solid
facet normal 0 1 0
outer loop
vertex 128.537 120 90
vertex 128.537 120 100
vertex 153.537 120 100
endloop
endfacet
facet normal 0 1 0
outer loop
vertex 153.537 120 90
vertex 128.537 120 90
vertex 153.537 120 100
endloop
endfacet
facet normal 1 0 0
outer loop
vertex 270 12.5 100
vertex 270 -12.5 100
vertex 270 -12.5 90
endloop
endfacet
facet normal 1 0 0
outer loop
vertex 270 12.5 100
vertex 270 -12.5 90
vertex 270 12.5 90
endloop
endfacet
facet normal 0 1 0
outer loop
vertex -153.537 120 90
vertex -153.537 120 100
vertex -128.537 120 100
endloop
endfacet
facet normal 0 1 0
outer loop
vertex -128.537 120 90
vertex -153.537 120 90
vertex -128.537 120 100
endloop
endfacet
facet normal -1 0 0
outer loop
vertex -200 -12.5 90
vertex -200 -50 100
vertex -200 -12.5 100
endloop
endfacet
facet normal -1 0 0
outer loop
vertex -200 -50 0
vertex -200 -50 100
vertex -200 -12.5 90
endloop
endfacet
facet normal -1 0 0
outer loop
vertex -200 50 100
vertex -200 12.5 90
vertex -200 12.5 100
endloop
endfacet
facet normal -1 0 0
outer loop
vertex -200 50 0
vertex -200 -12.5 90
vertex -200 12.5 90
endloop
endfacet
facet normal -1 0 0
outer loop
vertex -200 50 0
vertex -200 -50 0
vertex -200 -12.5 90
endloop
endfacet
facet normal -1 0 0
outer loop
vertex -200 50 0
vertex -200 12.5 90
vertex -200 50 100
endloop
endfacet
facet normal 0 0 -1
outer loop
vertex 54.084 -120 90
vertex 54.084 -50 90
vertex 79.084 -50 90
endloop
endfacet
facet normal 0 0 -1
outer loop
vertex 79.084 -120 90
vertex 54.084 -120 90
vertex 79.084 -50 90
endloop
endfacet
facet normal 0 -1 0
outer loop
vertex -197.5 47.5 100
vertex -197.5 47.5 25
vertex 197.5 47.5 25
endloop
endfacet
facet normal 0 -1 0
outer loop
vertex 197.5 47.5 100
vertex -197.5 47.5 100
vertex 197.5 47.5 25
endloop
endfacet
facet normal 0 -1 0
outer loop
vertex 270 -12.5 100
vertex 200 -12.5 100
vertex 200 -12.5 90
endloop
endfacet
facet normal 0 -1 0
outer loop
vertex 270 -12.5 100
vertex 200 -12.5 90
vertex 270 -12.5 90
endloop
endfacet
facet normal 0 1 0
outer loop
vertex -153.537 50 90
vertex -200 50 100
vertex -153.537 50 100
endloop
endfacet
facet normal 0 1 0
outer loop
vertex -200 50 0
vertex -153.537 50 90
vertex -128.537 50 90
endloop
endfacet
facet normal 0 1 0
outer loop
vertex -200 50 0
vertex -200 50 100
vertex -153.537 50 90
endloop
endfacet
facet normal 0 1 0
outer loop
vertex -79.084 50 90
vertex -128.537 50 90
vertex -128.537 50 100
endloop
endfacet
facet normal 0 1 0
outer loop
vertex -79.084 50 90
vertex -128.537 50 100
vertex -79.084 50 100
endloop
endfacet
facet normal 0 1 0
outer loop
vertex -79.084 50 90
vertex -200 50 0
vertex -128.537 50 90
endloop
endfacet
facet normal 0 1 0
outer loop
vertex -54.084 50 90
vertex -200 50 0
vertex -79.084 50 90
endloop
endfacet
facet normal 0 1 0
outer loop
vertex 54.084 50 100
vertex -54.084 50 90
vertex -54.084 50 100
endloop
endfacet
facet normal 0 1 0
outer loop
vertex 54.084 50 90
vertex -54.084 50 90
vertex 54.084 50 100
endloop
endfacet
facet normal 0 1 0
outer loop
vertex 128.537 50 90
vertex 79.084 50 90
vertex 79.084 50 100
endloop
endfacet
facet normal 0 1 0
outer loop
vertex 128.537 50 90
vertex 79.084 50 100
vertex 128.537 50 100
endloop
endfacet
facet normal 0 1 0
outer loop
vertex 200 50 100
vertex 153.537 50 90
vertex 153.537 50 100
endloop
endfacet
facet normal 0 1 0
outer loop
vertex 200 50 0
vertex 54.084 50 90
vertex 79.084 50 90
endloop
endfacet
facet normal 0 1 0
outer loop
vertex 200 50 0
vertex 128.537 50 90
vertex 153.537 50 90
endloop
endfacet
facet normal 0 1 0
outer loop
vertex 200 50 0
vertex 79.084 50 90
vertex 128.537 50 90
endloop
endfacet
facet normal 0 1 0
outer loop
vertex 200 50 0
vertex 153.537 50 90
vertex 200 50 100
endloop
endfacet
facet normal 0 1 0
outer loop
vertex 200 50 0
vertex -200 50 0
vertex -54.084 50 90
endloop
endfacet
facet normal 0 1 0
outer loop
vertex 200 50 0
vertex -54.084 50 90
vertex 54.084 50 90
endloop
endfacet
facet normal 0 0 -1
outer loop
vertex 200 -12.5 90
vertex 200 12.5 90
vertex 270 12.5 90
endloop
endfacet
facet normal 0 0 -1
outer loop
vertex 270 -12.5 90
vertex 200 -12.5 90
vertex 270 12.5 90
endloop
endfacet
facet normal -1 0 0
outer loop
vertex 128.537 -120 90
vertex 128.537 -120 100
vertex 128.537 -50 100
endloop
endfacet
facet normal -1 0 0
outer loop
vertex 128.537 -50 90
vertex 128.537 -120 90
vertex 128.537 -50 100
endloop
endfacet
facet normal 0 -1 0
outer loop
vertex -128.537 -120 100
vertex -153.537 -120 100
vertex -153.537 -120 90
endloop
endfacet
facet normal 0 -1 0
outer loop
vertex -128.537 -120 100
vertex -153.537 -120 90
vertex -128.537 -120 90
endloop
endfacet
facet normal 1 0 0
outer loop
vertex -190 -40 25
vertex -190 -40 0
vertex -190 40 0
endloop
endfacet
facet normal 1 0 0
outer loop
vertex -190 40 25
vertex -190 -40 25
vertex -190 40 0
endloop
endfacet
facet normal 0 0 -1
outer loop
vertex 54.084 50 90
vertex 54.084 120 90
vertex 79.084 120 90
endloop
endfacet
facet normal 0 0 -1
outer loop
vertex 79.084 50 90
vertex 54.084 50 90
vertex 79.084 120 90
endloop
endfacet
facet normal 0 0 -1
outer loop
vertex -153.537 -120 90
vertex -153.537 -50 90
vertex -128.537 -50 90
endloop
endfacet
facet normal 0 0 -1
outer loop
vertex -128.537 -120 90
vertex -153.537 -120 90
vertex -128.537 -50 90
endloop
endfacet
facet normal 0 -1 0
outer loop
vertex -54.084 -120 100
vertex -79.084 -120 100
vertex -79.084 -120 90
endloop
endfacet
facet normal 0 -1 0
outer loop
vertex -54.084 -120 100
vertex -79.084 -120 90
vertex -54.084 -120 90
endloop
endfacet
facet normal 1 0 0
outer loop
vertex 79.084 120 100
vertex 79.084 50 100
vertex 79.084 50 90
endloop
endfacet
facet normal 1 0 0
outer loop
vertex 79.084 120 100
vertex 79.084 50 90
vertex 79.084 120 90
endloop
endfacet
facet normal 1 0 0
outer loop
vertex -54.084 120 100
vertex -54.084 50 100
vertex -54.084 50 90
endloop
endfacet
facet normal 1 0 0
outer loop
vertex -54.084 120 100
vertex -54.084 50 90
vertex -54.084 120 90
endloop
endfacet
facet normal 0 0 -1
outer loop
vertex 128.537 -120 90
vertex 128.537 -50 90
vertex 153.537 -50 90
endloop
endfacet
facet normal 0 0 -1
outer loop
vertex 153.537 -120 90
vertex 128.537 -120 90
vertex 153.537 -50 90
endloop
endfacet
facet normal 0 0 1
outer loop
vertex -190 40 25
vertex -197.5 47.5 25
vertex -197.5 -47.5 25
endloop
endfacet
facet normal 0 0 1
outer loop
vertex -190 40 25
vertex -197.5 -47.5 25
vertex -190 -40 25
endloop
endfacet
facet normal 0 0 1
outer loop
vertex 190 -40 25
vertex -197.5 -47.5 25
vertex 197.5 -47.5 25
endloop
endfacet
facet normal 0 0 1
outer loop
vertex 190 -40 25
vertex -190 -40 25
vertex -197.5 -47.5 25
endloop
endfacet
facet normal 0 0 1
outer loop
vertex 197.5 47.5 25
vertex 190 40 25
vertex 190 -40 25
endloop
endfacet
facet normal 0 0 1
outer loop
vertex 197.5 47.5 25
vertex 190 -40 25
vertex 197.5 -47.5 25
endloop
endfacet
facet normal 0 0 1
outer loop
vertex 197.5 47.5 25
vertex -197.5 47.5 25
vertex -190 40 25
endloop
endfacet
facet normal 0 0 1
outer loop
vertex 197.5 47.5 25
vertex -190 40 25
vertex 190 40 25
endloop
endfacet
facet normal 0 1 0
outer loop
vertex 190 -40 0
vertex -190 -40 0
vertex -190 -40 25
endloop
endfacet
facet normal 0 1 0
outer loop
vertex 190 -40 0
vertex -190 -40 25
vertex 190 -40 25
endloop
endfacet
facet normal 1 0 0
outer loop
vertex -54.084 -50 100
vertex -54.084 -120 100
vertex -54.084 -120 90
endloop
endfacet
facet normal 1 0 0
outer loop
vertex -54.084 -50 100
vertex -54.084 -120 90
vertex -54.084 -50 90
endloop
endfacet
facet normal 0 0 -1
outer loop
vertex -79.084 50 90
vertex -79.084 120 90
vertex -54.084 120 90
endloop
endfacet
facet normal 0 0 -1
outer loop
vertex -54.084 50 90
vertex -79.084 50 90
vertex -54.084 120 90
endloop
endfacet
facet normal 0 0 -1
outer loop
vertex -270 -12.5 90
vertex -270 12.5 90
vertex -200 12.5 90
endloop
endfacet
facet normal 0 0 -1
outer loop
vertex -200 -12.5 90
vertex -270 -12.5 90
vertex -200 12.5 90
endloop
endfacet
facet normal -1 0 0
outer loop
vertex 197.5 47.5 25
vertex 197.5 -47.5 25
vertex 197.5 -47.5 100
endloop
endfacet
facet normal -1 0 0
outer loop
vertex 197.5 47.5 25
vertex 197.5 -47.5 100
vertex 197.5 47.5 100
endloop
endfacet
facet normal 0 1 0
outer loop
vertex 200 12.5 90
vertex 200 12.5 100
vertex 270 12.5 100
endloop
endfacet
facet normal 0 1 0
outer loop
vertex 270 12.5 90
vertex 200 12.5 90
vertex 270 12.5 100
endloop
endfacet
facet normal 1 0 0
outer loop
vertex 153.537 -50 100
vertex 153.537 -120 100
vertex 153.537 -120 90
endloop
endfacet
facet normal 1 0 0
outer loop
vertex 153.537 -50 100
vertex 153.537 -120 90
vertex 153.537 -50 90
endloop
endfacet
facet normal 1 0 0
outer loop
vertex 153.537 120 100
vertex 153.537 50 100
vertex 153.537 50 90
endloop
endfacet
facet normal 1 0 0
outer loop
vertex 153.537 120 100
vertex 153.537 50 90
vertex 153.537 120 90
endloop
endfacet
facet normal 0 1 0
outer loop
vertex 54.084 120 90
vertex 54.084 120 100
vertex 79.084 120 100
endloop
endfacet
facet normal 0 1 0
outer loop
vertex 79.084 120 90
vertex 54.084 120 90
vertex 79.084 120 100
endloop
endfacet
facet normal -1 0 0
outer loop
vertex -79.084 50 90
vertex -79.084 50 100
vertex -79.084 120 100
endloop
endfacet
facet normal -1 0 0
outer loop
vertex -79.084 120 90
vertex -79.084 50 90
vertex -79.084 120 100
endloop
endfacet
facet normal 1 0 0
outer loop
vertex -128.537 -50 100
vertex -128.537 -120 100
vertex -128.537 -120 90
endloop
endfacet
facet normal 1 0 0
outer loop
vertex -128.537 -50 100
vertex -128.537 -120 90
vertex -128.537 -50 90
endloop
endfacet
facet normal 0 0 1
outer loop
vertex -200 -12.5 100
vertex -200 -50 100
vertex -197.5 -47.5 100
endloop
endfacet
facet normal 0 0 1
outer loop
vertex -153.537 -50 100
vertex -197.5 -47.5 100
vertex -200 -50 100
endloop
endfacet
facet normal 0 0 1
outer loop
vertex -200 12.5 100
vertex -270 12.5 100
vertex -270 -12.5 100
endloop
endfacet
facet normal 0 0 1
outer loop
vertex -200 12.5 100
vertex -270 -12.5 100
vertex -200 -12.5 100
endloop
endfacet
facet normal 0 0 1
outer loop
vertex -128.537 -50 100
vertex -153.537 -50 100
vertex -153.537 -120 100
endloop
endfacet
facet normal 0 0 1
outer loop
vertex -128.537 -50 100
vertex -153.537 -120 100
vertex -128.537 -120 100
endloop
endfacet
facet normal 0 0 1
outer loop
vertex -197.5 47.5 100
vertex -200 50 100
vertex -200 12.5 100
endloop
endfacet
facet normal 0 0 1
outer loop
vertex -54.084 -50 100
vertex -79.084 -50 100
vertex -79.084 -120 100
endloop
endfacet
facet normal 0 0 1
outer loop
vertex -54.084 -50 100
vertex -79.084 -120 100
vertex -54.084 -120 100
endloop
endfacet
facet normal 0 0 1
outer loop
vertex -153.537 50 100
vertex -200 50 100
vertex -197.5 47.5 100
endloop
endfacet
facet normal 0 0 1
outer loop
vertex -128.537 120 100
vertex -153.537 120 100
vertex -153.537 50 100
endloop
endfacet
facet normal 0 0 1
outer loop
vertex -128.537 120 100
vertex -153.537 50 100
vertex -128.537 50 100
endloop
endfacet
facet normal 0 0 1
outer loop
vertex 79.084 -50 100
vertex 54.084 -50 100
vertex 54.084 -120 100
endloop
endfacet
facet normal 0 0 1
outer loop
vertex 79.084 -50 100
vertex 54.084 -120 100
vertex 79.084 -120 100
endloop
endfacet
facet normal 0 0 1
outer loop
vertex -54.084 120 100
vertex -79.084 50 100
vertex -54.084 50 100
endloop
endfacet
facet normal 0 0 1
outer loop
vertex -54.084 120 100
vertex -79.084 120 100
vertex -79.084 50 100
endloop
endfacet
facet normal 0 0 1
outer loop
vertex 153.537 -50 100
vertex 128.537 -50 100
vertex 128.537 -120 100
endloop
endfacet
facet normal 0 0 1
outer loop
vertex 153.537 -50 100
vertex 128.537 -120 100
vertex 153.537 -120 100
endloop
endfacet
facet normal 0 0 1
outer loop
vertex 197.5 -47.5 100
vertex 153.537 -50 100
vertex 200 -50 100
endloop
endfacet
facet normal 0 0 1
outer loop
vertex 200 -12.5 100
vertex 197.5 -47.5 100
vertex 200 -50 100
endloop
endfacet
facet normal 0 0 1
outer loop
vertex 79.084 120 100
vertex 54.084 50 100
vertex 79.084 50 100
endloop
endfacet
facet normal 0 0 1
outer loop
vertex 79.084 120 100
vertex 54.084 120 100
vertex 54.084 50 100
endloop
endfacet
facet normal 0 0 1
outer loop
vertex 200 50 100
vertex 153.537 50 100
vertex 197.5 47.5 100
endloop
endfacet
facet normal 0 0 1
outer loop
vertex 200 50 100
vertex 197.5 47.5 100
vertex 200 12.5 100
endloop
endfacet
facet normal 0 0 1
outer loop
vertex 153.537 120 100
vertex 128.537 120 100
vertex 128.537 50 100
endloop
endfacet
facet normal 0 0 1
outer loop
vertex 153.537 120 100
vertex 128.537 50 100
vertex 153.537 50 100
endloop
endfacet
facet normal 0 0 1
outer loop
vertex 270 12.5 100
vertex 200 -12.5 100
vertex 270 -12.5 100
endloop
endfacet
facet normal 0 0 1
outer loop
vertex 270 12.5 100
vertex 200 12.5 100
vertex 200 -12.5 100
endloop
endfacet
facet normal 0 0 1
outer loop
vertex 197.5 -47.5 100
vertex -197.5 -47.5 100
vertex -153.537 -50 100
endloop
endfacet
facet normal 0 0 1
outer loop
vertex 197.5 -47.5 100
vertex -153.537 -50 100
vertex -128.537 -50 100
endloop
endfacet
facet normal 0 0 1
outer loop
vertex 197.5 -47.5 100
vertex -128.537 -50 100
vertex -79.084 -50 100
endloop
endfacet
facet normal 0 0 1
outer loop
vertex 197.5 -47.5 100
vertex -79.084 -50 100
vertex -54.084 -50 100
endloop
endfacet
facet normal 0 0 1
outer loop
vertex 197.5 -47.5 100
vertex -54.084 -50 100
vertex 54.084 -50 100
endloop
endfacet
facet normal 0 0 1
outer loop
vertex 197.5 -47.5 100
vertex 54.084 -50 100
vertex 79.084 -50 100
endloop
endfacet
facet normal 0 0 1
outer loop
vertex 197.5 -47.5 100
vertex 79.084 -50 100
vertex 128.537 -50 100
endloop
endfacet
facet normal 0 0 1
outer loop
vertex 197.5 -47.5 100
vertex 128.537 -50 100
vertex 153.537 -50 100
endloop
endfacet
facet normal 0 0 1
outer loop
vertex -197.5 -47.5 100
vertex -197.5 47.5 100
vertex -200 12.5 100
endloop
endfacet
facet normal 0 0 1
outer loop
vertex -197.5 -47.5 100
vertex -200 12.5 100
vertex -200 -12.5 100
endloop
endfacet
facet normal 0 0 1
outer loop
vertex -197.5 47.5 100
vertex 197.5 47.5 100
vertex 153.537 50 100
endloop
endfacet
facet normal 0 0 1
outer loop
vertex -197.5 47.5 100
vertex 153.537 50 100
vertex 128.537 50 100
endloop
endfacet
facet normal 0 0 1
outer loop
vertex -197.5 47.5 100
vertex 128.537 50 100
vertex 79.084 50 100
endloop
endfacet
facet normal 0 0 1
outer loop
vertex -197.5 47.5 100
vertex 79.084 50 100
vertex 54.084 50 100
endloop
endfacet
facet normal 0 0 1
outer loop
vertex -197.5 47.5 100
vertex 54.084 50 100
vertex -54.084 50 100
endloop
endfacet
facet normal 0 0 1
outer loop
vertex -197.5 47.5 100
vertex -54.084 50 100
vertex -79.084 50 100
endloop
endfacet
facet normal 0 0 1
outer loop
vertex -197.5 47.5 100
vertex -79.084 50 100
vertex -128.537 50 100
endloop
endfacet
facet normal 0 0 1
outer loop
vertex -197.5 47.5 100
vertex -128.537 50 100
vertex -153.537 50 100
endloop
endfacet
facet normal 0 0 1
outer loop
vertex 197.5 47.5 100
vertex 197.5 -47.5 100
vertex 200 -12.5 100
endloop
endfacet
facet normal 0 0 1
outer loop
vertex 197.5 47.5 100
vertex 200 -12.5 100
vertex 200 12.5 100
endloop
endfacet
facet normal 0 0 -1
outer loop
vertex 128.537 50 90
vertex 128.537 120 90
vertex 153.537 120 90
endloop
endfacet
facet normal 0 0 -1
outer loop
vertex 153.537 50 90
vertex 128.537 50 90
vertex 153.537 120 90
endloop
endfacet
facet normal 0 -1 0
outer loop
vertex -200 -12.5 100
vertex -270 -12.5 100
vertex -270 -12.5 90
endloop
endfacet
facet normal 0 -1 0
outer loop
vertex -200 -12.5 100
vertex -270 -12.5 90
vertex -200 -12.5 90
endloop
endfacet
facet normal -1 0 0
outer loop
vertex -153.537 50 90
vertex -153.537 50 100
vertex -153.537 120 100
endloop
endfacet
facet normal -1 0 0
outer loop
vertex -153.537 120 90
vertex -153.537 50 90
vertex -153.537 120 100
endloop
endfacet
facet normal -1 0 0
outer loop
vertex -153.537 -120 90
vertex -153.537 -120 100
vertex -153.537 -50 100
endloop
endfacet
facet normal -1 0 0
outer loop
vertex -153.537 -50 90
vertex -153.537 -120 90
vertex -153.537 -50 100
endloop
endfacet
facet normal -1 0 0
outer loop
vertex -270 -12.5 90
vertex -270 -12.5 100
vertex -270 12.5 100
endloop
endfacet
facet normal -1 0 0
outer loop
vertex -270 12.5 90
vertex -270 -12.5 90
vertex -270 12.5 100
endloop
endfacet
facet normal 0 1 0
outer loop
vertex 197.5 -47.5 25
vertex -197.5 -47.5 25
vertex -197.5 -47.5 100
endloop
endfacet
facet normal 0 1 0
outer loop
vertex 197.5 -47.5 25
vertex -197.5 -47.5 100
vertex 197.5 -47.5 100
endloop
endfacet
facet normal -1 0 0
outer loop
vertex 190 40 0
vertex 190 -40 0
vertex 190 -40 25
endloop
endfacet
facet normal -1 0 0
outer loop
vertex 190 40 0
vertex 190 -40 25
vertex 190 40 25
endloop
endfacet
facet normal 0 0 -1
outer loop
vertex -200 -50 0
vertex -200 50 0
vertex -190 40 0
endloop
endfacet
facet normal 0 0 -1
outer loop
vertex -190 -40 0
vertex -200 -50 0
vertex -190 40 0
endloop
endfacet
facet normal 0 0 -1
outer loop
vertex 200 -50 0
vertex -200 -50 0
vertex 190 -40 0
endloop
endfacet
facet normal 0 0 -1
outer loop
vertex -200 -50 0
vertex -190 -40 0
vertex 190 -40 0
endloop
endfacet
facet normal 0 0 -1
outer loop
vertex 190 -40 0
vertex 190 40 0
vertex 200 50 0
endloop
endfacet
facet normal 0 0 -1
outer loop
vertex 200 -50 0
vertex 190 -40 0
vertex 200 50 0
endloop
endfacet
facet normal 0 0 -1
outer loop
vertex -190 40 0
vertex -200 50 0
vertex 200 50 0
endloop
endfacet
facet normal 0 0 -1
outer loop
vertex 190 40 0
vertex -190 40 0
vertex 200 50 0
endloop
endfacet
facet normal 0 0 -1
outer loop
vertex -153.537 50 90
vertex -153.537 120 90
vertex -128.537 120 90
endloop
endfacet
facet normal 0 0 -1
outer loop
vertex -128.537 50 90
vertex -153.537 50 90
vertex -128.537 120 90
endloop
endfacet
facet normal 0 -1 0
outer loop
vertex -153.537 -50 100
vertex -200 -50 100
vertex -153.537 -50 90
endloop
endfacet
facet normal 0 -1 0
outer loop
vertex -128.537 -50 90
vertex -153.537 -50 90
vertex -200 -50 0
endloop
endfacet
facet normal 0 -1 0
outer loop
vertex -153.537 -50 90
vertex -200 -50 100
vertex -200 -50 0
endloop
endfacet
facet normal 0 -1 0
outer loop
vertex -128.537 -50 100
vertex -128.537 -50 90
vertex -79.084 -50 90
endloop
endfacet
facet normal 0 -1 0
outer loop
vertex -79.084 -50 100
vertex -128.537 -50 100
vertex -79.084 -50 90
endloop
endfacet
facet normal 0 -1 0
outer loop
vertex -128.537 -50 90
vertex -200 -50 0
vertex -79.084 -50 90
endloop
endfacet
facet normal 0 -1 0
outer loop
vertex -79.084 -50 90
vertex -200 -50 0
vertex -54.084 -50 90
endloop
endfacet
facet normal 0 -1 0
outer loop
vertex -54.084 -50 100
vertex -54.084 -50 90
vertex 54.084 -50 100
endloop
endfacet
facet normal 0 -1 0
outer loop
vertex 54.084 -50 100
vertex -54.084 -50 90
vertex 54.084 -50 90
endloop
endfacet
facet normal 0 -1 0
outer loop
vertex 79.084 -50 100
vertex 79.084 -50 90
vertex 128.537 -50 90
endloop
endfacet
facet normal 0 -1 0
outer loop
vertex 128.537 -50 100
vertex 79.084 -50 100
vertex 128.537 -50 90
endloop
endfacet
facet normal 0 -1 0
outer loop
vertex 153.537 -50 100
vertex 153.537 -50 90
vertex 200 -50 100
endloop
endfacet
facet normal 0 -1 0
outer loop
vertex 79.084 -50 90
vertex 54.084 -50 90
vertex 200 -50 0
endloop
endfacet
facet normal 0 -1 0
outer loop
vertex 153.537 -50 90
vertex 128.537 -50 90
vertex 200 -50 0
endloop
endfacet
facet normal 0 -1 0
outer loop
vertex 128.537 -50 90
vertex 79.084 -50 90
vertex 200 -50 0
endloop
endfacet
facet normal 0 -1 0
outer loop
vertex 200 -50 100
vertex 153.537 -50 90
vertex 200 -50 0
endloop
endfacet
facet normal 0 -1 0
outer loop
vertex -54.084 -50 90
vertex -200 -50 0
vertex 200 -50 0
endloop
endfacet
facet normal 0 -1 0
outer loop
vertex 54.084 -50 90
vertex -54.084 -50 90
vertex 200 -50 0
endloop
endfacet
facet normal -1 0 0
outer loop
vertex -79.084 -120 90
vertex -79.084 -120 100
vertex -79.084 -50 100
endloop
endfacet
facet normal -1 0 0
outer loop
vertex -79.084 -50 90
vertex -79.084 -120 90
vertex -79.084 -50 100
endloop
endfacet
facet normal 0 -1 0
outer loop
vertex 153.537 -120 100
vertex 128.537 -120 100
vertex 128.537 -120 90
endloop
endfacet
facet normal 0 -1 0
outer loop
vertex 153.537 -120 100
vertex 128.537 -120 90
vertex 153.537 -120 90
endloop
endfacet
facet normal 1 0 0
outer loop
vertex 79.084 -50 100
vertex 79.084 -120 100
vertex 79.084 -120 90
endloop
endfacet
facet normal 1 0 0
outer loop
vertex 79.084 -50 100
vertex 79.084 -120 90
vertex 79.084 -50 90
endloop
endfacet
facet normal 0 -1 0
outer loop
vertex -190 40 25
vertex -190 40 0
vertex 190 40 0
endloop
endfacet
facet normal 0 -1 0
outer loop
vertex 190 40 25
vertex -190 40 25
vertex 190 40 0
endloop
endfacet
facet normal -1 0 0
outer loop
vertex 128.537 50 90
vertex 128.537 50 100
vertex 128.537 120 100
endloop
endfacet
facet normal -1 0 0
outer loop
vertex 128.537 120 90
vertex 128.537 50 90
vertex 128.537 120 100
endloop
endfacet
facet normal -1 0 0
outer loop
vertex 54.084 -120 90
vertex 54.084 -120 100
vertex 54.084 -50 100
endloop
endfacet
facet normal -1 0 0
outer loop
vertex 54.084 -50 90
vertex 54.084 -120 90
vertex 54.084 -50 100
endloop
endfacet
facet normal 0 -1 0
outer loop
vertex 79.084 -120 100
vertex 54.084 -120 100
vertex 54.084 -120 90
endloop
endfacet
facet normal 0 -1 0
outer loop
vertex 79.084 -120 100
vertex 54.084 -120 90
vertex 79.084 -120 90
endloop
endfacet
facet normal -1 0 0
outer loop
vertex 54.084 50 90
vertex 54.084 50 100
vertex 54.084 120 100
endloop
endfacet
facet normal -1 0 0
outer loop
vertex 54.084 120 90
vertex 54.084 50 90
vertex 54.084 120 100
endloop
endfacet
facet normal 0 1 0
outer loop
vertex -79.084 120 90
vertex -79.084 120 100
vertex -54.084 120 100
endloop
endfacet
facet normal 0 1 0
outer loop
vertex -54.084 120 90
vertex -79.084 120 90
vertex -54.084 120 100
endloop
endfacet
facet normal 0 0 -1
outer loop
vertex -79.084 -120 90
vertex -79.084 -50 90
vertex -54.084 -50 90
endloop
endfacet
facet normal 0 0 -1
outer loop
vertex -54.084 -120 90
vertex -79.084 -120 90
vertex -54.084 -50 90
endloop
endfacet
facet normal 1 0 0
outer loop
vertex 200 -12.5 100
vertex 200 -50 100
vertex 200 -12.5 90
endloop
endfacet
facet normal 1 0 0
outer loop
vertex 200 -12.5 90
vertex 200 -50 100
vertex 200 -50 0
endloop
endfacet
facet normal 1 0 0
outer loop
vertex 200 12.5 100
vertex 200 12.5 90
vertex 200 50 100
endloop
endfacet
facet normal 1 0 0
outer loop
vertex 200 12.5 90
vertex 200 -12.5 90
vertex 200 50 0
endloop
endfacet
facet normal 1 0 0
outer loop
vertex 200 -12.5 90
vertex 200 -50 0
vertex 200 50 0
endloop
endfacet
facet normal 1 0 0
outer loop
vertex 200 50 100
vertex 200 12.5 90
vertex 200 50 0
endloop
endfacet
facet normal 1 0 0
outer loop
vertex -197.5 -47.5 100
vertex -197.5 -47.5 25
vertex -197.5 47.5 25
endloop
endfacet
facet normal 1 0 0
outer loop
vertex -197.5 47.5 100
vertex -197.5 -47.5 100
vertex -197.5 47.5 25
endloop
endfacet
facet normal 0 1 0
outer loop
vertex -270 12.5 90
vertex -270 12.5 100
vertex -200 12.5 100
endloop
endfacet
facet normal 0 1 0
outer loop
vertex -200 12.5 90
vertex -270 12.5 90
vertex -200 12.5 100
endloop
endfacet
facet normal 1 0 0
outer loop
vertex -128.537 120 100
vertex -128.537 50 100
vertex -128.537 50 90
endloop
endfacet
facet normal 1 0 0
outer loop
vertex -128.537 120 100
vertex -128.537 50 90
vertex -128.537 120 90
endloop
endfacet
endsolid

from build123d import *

# Parameters (mm, degrees)
ESQUISSE1_W        = 400
ESQUISSE1_H        = 100
ESQUISSE1_W_2      = 395
ESQUISSE1_H_2      = 95
BOSS_EXTRU_2_DEPTH = 100
ESQUISSE3_W        = 400
ESQUISSE3_H        = 100
ESQUISSE3_W_2      = 380
ESQUISSE3_H_2      = 80
BOSS_EXTRU_3_DEPTH = 25
BOSS_EXTRU_4_START = 100
ESQUISSE4_W        = 70
ESQUISSE4_H        = 25
ESQUISSE4_W_2      = 25
ESQUISSE4_H_2      = 70
BOSS_EXTRU_4_DEPTH = 10


with BuildPart() as part:
    # Esquisse1 → Boss.-Extru.2 (new body)
    with BuildSketch(Plane.XY):
        Rectangle(ESQUISSE1_W, ESQUISSE1_H)
        Rectangle(ESQUISSE1_W_2, ESQUISSE1_H_2, mode=Mode.SUBTRACT)
    extrude(amount=BOSS_EXTRU_2_DEPTH)

    # Esquisse3 → Boss.-Extru.3 (add)
    with BuildSketch(Plane.XY):
        Rectangle(ESQUISSE3_W, ESQUISSE3_H)
        Rectangle(ESQUISSE3_W_2, ESQUISSE3_H_2, mode=Mode.SUBTRACT)
    extrude(amount=BOSS_EXTRU_3_DEPTH)

    # Esquisse4 → Boss.-Extru.4 (add)
    with BuildSketch(Plane.XY.offset(BOSS_EXTRU_4_START)):
        with Locations((-235, 0)):
            Rectangle(ESQUISSE4_W, ESQUISSE4_H)
        with Locations((235, 0)):
            Rectangle(ESQUISSE4_W, ESQUISSE4_H)
        with Locations((-141.037105637, 85)):
            Rectangle(ESQUISSE4_W_2, ESQUISSE4_H_2)
        with Locations((141.037105637, 85)):
            Rectangle(ESQUISSE4_W_2, ESQUISSE4_H_2)
        with Locations((-66.58352445, 85)):
            Rectangle(ESQUISSE4_W_2, ESQUISSE4_H_2)
        with Locations((66.58352445, 85)):
            Rectangle(ESQUISSE4_W_2, ESQUISSE4_H_2)
        with Locations((141.037105637, -85)):
            Rectangle(ESQUISSE4_W_2, ESQUISSE4_H_2)
        with Locations((66.58352445, -85)):
            Rectangle(ESQUISSE4_W_2, ESQUISSE4_H_2)
        with Locations((-66.58352445, -85)):
            Rectangle(ESQUISSE4_W_2, ESQUISSE4_H_2)
        with Locations((-141.037105637, -85)):
            Rectangle(ESQUISSE4_W_2, ESQUISSE4_H_2)
    extrude(amount=-BOSS_EXTRU_4_DEPTH)


solid = part.part
